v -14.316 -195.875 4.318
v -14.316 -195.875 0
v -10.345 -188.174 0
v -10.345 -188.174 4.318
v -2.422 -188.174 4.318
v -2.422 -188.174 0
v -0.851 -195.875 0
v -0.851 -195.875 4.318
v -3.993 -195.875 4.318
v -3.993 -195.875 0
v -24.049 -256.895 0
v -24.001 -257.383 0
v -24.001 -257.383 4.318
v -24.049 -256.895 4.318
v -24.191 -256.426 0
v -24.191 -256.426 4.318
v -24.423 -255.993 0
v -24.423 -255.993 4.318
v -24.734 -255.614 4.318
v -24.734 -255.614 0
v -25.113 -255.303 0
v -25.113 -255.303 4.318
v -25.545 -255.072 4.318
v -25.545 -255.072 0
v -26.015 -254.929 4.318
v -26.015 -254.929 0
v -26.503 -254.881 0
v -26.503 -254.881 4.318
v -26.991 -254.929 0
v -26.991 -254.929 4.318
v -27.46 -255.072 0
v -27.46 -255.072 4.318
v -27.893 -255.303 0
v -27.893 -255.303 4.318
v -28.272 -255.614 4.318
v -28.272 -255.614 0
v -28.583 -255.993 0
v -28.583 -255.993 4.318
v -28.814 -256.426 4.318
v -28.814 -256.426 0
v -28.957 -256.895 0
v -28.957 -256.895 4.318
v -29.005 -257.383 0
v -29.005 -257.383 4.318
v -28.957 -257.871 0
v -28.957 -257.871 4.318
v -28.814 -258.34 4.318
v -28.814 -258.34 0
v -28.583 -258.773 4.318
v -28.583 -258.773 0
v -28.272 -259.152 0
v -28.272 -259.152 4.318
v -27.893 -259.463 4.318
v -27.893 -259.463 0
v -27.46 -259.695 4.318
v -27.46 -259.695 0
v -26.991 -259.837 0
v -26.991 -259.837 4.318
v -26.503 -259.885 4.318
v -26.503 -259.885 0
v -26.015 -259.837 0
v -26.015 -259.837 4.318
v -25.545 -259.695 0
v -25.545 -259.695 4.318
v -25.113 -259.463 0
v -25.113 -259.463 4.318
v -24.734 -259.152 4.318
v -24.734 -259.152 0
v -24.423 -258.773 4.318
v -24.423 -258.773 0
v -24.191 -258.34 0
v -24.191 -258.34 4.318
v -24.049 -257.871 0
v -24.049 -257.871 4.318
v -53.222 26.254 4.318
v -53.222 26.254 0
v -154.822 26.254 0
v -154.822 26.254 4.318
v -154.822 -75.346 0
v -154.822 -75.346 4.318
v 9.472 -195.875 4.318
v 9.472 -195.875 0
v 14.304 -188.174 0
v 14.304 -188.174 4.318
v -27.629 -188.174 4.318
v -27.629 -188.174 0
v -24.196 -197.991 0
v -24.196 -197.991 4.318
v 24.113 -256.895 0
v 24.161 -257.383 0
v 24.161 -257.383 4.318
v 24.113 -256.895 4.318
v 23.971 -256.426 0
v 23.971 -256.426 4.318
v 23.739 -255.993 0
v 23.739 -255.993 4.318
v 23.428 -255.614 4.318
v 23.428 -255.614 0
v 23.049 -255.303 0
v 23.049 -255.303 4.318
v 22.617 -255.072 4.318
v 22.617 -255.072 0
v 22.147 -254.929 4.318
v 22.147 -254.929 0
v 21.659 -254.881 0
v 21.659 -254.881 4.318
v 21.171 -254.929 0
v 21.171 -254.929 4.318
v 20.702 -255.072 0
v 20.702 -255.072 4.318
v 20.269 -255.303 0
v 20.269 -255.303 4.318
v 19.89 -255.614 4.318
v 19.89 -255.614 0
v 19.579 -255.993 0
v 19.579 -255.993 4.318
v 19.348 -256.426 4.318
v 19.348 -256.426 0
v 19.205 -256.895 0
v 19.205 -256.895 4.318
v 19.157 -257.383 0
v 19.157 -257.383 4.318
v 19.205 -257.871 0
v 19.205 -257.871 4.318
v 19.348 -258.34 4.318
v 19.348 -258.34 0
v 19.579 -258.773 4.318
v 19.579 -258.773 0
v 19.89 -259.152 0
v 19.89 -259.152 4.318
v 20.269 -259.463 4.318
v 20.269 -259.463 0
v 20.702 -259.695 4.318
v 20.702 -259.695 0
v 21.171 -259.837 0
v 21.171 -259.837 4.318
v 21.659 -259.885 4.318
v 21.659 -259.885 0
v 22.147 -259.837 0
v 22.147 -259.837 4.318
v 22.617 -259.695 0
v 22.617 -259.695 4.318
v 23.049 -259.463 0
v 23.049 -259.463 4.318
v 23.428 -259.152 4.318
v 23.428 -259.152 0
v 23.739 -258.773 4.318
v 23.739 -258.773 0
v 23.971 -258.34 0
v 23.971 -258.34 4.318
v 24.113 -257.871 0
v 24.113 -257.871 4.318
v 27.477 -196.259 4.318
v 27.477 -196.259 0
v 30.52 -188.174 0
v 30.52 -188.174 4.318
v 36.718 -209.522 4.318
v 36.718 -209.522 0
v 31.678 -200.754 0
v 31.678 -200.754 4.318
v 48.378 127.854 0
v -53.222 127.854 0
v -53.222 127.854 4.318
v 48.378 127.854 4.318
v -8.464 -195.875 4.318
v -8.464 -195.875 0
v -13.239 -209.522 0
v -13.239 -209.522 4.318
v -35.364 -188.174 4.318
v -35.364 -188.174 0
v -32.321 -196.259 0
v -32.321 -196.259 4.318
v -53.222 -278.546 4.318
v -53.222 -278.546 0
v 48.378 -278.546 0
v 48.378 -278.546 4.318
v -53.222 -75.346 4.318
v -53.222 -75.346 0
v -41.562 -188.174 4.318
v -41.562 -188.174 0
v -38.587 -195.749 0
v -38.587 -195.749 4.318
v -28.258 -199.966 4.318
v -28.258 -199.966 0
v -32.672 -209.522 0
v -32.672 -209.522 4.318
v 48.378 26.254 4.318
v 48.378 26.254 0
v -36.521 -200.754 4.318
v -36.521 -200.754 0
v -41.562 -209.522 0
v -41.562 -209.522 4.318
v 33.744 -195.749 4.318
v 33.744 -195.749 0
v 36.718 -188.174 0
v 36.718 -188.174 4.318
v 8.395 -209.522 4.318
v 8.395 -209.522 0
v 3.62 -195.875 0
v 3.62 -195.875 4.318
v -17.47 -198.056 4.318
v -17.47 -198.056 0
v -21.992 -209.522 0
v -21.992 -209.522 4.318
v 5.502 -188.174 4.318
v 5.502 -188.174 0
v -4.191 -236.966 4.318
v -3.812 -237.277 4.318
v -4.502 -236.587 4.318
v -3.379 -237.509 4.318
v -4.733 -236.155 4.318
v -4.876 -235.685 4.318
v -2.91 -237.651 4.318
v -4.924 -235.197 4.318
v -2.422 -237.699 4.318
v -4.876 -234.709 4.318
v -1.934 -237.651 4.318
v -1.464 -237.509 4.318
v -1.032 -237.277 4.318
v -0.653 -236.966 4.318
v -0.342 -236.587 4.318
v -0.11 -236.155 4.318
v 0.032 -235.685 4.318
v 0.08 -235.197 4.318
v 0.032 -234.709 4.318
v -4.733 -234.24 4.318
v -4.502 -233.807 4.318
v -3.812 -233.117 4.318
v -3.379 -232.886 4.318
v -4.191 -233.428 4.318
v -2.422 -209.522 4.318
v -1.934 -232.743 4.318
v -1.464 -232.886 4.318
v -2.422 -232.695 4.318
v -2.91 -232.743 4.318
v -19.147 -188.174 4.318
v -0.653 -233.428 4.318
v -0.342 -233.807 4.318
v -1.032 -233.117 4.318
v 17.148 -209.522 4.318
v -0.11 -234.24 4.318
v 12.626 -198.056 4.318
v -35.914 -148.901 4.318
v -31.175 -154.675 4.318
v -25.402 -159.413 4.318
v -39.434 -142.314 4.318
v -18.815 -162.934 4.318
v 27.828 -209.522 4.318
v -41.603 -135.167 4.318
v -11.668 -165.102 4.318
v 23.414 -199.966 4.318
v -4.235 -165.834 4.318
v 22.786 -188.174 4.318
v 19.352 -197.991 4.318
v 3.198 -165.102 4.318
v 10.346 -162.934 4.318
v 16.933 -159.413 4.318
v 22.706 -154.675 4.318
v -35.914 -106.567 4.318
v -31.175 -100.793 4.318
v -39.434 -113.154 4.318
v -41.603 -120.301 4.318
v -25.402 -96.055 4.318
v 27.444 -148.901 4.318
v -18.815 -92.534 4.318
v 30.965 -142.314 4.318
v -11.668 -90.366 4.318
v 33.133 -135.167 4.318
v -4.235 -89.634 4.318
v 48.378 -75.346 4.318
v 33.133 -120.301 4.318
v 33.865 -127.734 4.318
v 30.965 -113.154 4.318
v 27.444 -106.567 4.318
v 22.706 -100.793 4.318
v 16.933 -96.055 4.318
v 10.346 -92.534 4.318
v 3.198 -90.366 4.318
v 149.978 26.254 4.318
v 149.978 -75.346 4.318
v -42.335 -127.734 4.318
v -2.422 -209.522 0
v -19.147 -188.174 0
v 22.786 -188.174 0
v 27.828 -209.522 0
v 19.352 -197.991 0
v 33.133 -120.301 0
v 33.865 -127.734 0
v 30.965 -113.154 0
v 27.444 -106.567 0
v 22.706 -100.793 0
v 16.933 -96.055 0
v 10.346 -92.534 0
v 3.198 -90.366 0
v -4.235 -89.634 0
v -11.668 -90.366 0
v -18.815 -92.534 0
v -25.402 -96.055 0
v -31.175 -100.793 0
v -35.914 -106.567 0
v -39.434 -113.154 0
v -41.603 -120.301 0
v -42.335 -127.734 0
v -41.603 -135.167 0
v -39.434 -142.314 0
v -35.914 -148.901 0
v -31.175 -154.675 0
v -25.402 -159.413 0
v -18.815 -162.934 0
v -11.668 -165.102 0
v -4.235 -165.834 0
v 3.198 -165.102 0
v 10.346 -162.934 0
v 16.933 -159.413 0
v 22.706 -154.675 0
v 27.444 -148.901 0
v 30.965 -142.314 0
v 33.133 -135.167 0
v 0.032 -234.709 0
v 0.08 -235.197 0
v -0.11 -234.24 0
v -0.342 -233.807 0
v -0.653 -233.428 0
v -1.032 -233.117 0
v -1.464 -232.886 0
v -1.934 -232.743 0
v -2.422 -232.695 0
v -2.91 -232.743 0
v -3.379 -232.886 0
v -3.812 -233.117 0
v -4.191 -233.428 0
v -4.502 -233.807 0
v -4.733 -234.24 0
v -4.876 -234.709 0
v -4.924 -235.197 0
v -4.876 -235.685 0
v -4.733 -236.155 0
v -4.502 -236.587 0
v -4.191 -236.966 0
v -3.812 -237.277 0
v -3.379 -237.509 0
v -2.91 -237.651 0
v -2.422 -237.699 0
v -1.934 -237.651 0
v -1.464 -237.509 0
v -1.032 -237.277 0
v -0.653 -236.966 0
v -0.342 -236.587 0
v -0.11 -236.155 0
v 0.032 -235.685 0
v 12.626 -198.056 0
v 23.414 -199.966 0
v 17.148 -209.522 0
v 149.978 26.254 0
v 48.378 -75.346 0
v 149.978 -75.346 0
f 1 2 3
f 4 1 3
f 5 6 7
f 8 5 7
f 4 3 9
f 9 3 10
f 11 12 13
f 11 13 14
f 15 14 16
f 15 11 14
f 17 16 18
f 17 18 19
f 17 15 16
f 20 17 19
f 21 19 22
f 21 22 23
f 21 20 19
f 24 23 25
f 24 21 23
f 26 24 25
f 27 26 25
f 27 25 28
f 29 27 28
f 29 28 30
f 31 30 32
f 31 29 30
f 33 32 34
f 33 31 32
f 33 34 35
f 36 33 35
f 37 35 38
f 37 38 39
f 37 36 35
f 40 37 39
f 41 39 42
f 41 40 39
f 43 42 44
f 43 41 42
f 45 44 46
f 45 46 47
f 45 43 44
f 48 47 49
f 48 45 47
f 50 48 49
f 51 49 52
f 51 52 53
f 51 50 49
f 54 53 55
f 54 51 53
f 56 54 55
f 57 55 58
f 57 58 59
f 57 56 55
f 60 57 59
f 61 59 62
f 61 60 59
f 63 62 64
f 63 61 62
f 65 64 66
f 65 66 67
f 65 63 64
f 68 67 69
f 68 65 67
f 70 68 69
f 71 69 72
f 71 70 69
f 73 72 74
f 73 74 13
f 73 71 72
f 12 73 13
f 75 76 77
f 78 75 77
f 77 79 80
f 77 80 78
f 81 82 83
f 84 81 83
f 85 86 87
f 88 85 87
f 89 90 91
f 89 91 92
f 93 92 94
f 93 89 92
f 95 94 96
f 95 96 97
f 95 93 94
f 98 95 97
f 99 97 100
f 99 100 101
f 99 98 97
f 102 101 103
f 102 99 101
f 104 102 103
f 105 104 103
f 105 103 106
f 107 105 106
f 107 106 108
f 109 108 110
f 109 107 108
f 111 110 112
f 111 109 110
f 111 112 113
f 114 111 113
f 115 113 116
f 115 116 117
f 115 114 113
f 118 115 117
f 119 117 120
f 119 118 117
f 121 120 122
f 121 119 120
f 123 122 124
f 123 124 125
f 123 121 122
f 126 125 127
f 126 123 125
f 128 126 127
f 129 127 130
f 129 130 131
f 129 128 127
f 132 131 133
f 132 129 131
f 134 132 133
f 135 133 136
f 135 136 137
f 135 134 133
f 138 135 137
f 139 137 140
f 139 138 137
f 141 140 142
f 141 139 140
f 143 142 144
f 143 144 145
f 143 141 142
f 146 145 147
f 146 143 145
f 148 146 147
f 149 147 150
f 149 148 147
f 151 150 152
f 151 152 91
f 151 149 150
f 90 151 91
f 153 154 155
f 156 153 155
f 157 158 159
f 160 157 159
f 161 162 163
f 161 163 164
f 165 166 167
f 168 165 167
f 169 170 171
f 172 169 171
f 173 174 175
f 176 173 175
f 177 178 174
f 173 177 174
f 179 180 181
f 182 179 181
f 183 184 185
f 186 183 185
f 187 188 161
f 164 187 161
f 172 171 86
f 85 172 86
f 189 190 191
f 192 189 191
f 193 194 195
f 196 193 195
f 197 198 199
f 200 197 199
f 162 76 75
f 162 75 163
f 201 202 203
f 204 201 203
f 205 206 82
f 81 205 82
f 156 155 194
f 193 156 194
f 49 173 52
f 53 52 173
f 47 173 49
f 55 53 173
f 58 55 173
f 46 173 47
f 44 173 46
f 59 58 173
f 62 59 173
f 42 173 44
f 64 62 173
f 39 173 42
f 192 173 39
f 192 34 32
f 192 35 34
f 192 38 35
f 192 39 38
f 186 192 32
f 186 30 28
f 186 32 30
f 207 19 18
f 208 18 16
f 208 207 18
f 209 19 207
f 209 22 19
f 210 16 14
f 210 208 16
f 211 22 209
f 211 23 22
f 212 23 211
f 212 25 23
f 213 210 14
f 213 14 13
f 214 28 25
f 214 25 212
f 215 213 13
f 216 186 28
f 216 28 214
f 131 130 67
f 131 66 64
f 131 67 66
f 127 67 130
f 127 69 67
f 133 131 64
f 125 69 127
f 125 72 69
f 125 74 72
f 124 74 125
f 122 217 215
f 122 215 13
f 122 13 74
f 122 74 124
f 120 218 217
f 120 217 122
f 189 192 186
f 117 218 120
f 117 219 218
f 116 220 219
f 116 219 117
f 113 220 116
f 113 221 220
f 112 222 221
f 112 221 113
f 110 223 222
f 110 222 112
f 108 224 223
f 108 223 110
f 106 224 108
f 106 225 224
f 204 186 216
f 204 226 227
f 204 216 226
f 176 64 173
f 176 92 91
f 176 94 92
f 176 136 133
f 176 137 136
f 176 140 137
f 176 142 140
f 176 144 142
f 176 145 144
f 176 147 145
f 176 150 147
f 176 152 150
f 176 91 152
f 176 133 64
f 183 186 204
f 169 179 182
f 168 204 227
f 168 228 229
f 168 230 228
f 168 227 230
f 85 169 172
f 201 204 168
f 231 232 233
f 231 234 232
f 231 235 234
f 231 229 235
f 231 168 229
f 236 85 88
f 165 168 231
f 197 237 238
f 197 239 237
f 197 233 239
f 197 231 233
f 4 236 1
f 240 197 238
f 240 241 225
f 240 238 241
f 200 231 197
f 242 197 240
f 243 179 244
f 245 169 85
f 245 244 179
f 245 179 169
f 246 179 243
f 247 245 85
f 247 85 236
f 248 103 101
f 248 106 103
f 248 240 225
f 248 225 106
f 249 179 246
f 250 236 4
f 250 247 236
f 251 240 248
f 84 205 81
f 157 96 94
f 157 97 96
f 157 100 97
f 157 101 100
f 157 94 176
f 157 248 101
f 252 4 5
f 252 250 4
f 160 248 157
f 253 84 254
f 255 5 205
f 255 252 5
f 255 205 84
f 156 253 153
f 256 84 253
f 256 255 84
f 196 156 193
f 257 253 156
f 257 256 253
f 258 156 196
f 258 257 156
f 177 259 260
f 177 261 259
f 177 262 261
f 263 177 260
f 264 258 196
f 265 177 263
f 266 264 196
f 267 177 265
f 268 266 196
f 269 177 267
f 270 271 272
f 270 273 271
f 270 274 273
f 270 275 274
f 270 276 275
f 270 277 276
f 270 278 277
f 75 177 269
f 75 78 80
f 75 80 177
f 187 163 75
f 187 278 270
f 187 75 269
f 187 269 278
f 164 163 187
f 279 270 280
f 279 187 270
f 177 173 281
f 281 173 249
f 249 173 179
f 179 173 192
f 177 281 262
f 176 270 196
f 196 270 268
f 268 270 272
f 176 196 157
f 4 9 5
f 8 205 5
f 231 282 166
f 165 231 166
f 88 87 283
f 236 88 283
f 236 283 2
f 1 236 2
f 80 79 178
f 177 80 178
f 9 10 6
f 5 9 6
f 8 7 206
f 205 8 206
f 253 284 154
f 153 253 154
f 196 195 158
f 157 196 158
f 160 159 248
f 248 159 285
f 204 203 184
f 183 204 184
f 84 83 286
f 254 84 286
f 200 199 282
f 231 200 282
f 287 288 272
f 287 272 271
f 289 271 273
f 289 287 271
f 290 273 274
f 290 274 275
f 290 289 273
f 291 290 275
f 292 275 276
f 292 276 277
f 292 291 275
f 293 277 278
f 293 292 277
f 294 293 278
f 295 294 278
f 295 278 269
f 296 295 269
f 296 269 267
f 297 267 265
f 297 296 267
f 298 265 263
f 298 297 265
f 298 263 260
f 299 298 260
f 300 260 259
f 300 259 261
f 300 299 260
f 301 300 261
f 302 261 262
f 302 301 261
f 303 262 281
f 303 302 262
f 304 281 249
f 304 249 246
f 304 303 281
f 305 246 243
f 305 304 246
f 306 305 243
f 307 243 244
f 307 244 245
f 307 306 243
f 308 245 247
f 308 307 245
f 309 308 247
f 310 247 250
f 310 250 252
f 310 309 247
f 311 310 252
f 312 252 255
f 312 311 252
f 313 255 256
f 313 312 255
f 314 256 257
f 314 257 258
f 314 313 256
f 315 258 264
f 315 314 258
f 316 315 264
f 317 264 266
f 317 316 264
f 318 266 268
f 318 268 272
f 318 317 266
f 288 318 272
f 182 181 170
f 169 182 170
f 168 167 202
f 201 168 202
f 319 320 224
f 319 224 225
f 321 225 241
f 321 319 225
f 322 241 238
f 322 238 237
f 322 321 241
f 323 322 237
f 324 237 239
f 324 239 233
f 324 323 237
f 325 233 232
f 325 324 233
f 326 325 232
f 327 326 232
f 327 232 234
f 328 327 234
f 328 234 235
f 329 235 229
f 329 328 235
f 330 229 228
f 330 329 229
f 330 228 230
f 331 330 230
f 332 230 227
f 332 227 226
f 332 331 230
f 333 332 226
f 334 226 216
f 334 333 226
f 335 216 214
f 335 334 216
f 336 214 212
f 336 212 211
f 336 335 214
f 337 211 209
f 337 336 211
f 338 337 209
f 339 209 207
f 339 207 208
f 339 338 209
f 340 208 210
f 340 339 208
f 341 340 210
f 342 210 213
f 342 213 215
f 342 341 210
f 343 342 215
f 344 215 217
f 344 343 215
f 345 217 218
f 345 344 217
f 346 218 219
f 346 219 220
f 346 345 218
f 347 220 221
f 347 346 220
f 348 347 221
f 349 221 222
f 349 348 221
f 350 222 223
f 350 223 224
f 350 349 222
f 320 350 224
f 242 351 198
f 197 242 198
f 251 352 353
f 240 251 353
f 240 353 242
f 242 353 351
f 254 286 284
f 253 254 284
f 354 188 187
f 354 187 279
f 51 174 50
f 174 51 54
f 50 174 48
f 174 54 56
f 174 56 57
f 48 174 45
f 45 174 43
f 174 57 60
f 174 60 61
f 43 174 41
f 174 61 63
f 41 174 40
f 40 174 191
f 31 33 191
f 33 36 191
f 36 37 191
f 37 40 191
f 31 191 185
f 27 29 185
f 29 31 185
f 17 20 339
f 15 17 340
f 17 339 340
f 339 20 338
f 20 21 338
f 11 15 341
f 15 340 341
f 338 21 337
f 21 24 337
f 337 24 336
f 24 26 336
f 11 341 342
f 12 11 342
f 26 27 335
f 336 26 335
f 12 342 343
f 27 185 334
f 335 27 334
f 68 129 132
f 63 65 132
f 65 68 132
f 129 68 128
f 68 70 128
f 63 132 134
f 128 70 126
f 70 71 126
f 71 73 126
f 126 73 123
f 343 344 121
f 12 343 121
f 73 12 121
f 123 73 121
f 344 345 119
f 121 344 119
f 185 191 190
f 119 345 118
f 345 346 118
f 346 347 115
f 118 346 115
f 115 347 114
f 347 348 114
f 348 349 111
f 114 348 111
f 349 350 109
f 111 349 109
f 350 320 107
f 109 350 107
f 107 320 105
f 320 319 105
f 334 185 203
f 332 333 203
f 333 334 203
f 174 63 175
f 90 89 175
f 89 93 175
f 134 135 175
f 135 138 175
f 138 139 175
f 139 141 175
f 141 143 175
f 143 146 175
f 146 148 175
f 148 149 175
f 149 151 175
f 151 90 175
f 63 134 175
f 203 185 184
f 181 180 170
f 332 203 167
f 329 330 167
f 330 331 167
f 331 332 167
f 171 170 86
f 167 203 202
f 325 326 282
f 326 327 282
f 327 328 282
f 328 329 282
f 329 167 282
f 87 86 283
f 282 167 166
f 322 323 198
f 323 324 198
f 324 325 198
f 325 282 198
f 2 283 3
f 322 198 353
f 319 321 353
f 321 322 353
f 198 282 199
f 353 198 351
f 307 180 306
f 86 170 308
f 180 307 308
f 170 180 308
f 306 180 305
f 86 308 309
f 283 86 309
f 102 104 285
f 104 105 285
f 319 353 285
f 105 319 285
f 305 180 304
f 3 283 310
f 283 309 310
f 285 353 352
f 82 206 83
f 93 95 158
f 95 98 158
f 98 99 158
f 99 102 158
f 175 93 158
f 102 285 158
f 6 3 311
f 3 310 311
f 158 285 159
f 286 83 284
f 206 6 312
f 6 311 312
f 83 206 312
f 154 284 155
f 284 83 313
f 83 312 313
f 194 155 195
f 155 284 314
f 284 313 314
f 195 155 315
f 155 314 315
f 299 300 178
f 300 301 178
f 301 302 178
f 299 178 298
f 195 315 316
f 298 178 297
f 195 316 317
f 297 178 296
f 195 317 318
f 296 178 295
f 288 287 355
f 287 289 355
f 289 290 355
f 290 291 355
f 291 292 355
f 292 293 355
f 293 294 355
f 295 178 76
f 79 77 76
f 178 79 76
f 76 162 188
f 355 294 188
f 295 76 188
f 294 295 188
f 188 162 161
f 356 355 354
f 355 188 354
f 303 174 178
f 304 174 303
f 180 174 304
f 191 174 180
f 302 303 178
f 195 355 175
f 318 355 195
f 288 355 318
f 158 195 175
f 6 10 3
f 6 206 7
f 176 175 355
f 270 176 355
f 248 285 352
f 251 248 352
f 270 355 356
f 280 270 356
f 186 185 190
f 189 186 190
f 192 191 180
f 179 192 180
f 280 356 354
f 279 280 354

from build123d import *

# Parameters (mm, degrees)
F0_W     = 101.6
F0_H     = 101.6
F0_R     = 38.1
F0_R_2   = 2.5019
F1_DEPTH = 4.318
F2_DEPTH = 4.318


with BuildPart() as f1:
    # F0 (on Top) → F1 (new body)
    with BuildSketch(Plane.XY):
        with Locations((-104.021908, -24.545676)):
            Rectangle(F0_W, F0_H)
        with Locations((-2.421908, -24.545676)):
            Rectangle(F0_W, F0_H)
        with Locations((-2.421908, 77.054324)):
            Rectangle(F0_W, F0_H)
        with Locations((99.178092, -24.545676)):
            Rectangle(F0_W, F0_H)
        with Locations((-2.421908, -126.145676)):
            Rectangle(F0_W, F0_H)
        with Locations((-4.234652, -127.733991)):
            Circle(F0_R, mode=Mode.SUBTRACT)
        with Locations((-2.421908, -227.745676)):
            Rectangle(F0_W, F0_H)
        with Locations((-26.502896, -257.383049)):
            Circle(F0_R_2, mode=Mode.SUBTRACT)
        with Locations((21.65908, -257.383049)):
            Circle(F0_R_2, mode=Mode.SUBTRACT)
        with Locations((-2.421908, -235.197216)):
            Circle(F0_R_2, mode=Mode.SUBTRACT)
        Polygon((-41.561957, -209.521994), (-41.561957, -188.174039), (-38.587328, -195.748523), (-35.364017, -188.174039), (-32.320578, -196.259379), (-27.629388, -188.174039), (-24.196096, -197.991371), (-19.147361, -188.174039), (-14.316184, -195.874706), (-10.345475, -188.174039), (-3.992576, -195.874706), (-2.421908, -188.174039), (-0.85124, -195.874706), (5.501659, -188.174039), (9.472368, -195.874706), (14.303545, -188.174039), (19.35228, -197.991371), (22.785572, -188.174039), (27.476761, -196.259379), (30.520201, -188.174039), (33.743512, -195.748523), (36.718141, -188.174039), (36.718141, -209.521994), (31.677574, -200.754404), (27.82803, -209.521994), (23.414299, -199.966282), (17.148117, -209.521994), (12.626316, -198.055878), (8.395368, -209.521994), (3.620354, -195.874706), (-2.421908, -209.521994), (-8.464171, -195.874706), (-13.239184, -209.521994), (-17.470133, -198.055878), (-21.991933, -209.521994), (-28.258115, -199.966282), (-32.671846, -209.521994), (-36.52139, -200.754404), align=None, mode=Mode.SUBTRACT)
    extrude(amount=F1_DEPTH)

    # F0 (on Top) → F2 (join)
    with BuildSketch(Plane.XY):
        with Locations((-2.421908, 77.054324)):
            Rectangle(F0_W, F0_H)
        with Locations((-104.021908, -24.545676)):
            Rectangle(F0_W, F0_H)
        with Locations((99.178092, -24.545676)):
            Rectangle(F0_W, F0_H)
        with Locations((-2.421908, -126.145676)):
            Rectangle(F0_W, F0_H)
        with Locations((-4.234652, -127.733991)):
            Circle(F0_R, mode=Mode.SUBTRACT)
        with Locations((-2.421908, -227.745676)):
            Rectangle(F0_W, F0_H)
        with Locations((-26.502896, -257.383049)):
            Circle(F0_R_2, mode=Mode.SUBTRACT)
        with Locations((21.65908, -257.383049)):
            Circle(F0_R_2, mode=Mode.SUBTRACT)
        with Locations((-2.421908, -235.197216)):
            Circle(F0_R_2, mode=Mode.SUBTRACT)
        Polygon((-41.561957, -209.521994), (-41.561957, -188.174039), (-38.587328, -195.748523), (-35.364017, -188.174039), (-32.320578, -196.259379), (-27.629388, -188.174039), (-24.196096, -197.991371), (-19.147361, -188.174039), (-14.316184, -195.874706), (-10.345475, -188.174039), (-3.992576, -195.874706), (-2.421908, -188.174039), (-0.85124, -195.874706), (5.501659, -188.174039), (9.472368, -195.874706), (14.303545, -188.174039), (19.35228, -197.991371), (22.785572, -188.174039), (27.476761, -196.259379), (30.520201, -188.174039), (33.743512, -195.748523), (36.718141, -188.174039), (36.718141, -209.521994), (31.677574, -200.754404), (27.82803, -209.521994), (23.414299, -199.966282), (17.148117, -209.521994), (12.626316, -198.055878), (8.395368, -209.521994), (3.620354, -195.874706), (-2.421908, -209.521994), (-8.464171, -195.874706), (-13.239184, -209.521994), (-17.470133, -198.055878), (-21.991933, -209.521994), (-28.258115, -199.966282), (-32.671846, -209.521994), (-36.52139, -200.754404), align=None, mode=Mode.SUBTRACT)
    extrude(amount=F2_DEPTH)


solid = f1.part
